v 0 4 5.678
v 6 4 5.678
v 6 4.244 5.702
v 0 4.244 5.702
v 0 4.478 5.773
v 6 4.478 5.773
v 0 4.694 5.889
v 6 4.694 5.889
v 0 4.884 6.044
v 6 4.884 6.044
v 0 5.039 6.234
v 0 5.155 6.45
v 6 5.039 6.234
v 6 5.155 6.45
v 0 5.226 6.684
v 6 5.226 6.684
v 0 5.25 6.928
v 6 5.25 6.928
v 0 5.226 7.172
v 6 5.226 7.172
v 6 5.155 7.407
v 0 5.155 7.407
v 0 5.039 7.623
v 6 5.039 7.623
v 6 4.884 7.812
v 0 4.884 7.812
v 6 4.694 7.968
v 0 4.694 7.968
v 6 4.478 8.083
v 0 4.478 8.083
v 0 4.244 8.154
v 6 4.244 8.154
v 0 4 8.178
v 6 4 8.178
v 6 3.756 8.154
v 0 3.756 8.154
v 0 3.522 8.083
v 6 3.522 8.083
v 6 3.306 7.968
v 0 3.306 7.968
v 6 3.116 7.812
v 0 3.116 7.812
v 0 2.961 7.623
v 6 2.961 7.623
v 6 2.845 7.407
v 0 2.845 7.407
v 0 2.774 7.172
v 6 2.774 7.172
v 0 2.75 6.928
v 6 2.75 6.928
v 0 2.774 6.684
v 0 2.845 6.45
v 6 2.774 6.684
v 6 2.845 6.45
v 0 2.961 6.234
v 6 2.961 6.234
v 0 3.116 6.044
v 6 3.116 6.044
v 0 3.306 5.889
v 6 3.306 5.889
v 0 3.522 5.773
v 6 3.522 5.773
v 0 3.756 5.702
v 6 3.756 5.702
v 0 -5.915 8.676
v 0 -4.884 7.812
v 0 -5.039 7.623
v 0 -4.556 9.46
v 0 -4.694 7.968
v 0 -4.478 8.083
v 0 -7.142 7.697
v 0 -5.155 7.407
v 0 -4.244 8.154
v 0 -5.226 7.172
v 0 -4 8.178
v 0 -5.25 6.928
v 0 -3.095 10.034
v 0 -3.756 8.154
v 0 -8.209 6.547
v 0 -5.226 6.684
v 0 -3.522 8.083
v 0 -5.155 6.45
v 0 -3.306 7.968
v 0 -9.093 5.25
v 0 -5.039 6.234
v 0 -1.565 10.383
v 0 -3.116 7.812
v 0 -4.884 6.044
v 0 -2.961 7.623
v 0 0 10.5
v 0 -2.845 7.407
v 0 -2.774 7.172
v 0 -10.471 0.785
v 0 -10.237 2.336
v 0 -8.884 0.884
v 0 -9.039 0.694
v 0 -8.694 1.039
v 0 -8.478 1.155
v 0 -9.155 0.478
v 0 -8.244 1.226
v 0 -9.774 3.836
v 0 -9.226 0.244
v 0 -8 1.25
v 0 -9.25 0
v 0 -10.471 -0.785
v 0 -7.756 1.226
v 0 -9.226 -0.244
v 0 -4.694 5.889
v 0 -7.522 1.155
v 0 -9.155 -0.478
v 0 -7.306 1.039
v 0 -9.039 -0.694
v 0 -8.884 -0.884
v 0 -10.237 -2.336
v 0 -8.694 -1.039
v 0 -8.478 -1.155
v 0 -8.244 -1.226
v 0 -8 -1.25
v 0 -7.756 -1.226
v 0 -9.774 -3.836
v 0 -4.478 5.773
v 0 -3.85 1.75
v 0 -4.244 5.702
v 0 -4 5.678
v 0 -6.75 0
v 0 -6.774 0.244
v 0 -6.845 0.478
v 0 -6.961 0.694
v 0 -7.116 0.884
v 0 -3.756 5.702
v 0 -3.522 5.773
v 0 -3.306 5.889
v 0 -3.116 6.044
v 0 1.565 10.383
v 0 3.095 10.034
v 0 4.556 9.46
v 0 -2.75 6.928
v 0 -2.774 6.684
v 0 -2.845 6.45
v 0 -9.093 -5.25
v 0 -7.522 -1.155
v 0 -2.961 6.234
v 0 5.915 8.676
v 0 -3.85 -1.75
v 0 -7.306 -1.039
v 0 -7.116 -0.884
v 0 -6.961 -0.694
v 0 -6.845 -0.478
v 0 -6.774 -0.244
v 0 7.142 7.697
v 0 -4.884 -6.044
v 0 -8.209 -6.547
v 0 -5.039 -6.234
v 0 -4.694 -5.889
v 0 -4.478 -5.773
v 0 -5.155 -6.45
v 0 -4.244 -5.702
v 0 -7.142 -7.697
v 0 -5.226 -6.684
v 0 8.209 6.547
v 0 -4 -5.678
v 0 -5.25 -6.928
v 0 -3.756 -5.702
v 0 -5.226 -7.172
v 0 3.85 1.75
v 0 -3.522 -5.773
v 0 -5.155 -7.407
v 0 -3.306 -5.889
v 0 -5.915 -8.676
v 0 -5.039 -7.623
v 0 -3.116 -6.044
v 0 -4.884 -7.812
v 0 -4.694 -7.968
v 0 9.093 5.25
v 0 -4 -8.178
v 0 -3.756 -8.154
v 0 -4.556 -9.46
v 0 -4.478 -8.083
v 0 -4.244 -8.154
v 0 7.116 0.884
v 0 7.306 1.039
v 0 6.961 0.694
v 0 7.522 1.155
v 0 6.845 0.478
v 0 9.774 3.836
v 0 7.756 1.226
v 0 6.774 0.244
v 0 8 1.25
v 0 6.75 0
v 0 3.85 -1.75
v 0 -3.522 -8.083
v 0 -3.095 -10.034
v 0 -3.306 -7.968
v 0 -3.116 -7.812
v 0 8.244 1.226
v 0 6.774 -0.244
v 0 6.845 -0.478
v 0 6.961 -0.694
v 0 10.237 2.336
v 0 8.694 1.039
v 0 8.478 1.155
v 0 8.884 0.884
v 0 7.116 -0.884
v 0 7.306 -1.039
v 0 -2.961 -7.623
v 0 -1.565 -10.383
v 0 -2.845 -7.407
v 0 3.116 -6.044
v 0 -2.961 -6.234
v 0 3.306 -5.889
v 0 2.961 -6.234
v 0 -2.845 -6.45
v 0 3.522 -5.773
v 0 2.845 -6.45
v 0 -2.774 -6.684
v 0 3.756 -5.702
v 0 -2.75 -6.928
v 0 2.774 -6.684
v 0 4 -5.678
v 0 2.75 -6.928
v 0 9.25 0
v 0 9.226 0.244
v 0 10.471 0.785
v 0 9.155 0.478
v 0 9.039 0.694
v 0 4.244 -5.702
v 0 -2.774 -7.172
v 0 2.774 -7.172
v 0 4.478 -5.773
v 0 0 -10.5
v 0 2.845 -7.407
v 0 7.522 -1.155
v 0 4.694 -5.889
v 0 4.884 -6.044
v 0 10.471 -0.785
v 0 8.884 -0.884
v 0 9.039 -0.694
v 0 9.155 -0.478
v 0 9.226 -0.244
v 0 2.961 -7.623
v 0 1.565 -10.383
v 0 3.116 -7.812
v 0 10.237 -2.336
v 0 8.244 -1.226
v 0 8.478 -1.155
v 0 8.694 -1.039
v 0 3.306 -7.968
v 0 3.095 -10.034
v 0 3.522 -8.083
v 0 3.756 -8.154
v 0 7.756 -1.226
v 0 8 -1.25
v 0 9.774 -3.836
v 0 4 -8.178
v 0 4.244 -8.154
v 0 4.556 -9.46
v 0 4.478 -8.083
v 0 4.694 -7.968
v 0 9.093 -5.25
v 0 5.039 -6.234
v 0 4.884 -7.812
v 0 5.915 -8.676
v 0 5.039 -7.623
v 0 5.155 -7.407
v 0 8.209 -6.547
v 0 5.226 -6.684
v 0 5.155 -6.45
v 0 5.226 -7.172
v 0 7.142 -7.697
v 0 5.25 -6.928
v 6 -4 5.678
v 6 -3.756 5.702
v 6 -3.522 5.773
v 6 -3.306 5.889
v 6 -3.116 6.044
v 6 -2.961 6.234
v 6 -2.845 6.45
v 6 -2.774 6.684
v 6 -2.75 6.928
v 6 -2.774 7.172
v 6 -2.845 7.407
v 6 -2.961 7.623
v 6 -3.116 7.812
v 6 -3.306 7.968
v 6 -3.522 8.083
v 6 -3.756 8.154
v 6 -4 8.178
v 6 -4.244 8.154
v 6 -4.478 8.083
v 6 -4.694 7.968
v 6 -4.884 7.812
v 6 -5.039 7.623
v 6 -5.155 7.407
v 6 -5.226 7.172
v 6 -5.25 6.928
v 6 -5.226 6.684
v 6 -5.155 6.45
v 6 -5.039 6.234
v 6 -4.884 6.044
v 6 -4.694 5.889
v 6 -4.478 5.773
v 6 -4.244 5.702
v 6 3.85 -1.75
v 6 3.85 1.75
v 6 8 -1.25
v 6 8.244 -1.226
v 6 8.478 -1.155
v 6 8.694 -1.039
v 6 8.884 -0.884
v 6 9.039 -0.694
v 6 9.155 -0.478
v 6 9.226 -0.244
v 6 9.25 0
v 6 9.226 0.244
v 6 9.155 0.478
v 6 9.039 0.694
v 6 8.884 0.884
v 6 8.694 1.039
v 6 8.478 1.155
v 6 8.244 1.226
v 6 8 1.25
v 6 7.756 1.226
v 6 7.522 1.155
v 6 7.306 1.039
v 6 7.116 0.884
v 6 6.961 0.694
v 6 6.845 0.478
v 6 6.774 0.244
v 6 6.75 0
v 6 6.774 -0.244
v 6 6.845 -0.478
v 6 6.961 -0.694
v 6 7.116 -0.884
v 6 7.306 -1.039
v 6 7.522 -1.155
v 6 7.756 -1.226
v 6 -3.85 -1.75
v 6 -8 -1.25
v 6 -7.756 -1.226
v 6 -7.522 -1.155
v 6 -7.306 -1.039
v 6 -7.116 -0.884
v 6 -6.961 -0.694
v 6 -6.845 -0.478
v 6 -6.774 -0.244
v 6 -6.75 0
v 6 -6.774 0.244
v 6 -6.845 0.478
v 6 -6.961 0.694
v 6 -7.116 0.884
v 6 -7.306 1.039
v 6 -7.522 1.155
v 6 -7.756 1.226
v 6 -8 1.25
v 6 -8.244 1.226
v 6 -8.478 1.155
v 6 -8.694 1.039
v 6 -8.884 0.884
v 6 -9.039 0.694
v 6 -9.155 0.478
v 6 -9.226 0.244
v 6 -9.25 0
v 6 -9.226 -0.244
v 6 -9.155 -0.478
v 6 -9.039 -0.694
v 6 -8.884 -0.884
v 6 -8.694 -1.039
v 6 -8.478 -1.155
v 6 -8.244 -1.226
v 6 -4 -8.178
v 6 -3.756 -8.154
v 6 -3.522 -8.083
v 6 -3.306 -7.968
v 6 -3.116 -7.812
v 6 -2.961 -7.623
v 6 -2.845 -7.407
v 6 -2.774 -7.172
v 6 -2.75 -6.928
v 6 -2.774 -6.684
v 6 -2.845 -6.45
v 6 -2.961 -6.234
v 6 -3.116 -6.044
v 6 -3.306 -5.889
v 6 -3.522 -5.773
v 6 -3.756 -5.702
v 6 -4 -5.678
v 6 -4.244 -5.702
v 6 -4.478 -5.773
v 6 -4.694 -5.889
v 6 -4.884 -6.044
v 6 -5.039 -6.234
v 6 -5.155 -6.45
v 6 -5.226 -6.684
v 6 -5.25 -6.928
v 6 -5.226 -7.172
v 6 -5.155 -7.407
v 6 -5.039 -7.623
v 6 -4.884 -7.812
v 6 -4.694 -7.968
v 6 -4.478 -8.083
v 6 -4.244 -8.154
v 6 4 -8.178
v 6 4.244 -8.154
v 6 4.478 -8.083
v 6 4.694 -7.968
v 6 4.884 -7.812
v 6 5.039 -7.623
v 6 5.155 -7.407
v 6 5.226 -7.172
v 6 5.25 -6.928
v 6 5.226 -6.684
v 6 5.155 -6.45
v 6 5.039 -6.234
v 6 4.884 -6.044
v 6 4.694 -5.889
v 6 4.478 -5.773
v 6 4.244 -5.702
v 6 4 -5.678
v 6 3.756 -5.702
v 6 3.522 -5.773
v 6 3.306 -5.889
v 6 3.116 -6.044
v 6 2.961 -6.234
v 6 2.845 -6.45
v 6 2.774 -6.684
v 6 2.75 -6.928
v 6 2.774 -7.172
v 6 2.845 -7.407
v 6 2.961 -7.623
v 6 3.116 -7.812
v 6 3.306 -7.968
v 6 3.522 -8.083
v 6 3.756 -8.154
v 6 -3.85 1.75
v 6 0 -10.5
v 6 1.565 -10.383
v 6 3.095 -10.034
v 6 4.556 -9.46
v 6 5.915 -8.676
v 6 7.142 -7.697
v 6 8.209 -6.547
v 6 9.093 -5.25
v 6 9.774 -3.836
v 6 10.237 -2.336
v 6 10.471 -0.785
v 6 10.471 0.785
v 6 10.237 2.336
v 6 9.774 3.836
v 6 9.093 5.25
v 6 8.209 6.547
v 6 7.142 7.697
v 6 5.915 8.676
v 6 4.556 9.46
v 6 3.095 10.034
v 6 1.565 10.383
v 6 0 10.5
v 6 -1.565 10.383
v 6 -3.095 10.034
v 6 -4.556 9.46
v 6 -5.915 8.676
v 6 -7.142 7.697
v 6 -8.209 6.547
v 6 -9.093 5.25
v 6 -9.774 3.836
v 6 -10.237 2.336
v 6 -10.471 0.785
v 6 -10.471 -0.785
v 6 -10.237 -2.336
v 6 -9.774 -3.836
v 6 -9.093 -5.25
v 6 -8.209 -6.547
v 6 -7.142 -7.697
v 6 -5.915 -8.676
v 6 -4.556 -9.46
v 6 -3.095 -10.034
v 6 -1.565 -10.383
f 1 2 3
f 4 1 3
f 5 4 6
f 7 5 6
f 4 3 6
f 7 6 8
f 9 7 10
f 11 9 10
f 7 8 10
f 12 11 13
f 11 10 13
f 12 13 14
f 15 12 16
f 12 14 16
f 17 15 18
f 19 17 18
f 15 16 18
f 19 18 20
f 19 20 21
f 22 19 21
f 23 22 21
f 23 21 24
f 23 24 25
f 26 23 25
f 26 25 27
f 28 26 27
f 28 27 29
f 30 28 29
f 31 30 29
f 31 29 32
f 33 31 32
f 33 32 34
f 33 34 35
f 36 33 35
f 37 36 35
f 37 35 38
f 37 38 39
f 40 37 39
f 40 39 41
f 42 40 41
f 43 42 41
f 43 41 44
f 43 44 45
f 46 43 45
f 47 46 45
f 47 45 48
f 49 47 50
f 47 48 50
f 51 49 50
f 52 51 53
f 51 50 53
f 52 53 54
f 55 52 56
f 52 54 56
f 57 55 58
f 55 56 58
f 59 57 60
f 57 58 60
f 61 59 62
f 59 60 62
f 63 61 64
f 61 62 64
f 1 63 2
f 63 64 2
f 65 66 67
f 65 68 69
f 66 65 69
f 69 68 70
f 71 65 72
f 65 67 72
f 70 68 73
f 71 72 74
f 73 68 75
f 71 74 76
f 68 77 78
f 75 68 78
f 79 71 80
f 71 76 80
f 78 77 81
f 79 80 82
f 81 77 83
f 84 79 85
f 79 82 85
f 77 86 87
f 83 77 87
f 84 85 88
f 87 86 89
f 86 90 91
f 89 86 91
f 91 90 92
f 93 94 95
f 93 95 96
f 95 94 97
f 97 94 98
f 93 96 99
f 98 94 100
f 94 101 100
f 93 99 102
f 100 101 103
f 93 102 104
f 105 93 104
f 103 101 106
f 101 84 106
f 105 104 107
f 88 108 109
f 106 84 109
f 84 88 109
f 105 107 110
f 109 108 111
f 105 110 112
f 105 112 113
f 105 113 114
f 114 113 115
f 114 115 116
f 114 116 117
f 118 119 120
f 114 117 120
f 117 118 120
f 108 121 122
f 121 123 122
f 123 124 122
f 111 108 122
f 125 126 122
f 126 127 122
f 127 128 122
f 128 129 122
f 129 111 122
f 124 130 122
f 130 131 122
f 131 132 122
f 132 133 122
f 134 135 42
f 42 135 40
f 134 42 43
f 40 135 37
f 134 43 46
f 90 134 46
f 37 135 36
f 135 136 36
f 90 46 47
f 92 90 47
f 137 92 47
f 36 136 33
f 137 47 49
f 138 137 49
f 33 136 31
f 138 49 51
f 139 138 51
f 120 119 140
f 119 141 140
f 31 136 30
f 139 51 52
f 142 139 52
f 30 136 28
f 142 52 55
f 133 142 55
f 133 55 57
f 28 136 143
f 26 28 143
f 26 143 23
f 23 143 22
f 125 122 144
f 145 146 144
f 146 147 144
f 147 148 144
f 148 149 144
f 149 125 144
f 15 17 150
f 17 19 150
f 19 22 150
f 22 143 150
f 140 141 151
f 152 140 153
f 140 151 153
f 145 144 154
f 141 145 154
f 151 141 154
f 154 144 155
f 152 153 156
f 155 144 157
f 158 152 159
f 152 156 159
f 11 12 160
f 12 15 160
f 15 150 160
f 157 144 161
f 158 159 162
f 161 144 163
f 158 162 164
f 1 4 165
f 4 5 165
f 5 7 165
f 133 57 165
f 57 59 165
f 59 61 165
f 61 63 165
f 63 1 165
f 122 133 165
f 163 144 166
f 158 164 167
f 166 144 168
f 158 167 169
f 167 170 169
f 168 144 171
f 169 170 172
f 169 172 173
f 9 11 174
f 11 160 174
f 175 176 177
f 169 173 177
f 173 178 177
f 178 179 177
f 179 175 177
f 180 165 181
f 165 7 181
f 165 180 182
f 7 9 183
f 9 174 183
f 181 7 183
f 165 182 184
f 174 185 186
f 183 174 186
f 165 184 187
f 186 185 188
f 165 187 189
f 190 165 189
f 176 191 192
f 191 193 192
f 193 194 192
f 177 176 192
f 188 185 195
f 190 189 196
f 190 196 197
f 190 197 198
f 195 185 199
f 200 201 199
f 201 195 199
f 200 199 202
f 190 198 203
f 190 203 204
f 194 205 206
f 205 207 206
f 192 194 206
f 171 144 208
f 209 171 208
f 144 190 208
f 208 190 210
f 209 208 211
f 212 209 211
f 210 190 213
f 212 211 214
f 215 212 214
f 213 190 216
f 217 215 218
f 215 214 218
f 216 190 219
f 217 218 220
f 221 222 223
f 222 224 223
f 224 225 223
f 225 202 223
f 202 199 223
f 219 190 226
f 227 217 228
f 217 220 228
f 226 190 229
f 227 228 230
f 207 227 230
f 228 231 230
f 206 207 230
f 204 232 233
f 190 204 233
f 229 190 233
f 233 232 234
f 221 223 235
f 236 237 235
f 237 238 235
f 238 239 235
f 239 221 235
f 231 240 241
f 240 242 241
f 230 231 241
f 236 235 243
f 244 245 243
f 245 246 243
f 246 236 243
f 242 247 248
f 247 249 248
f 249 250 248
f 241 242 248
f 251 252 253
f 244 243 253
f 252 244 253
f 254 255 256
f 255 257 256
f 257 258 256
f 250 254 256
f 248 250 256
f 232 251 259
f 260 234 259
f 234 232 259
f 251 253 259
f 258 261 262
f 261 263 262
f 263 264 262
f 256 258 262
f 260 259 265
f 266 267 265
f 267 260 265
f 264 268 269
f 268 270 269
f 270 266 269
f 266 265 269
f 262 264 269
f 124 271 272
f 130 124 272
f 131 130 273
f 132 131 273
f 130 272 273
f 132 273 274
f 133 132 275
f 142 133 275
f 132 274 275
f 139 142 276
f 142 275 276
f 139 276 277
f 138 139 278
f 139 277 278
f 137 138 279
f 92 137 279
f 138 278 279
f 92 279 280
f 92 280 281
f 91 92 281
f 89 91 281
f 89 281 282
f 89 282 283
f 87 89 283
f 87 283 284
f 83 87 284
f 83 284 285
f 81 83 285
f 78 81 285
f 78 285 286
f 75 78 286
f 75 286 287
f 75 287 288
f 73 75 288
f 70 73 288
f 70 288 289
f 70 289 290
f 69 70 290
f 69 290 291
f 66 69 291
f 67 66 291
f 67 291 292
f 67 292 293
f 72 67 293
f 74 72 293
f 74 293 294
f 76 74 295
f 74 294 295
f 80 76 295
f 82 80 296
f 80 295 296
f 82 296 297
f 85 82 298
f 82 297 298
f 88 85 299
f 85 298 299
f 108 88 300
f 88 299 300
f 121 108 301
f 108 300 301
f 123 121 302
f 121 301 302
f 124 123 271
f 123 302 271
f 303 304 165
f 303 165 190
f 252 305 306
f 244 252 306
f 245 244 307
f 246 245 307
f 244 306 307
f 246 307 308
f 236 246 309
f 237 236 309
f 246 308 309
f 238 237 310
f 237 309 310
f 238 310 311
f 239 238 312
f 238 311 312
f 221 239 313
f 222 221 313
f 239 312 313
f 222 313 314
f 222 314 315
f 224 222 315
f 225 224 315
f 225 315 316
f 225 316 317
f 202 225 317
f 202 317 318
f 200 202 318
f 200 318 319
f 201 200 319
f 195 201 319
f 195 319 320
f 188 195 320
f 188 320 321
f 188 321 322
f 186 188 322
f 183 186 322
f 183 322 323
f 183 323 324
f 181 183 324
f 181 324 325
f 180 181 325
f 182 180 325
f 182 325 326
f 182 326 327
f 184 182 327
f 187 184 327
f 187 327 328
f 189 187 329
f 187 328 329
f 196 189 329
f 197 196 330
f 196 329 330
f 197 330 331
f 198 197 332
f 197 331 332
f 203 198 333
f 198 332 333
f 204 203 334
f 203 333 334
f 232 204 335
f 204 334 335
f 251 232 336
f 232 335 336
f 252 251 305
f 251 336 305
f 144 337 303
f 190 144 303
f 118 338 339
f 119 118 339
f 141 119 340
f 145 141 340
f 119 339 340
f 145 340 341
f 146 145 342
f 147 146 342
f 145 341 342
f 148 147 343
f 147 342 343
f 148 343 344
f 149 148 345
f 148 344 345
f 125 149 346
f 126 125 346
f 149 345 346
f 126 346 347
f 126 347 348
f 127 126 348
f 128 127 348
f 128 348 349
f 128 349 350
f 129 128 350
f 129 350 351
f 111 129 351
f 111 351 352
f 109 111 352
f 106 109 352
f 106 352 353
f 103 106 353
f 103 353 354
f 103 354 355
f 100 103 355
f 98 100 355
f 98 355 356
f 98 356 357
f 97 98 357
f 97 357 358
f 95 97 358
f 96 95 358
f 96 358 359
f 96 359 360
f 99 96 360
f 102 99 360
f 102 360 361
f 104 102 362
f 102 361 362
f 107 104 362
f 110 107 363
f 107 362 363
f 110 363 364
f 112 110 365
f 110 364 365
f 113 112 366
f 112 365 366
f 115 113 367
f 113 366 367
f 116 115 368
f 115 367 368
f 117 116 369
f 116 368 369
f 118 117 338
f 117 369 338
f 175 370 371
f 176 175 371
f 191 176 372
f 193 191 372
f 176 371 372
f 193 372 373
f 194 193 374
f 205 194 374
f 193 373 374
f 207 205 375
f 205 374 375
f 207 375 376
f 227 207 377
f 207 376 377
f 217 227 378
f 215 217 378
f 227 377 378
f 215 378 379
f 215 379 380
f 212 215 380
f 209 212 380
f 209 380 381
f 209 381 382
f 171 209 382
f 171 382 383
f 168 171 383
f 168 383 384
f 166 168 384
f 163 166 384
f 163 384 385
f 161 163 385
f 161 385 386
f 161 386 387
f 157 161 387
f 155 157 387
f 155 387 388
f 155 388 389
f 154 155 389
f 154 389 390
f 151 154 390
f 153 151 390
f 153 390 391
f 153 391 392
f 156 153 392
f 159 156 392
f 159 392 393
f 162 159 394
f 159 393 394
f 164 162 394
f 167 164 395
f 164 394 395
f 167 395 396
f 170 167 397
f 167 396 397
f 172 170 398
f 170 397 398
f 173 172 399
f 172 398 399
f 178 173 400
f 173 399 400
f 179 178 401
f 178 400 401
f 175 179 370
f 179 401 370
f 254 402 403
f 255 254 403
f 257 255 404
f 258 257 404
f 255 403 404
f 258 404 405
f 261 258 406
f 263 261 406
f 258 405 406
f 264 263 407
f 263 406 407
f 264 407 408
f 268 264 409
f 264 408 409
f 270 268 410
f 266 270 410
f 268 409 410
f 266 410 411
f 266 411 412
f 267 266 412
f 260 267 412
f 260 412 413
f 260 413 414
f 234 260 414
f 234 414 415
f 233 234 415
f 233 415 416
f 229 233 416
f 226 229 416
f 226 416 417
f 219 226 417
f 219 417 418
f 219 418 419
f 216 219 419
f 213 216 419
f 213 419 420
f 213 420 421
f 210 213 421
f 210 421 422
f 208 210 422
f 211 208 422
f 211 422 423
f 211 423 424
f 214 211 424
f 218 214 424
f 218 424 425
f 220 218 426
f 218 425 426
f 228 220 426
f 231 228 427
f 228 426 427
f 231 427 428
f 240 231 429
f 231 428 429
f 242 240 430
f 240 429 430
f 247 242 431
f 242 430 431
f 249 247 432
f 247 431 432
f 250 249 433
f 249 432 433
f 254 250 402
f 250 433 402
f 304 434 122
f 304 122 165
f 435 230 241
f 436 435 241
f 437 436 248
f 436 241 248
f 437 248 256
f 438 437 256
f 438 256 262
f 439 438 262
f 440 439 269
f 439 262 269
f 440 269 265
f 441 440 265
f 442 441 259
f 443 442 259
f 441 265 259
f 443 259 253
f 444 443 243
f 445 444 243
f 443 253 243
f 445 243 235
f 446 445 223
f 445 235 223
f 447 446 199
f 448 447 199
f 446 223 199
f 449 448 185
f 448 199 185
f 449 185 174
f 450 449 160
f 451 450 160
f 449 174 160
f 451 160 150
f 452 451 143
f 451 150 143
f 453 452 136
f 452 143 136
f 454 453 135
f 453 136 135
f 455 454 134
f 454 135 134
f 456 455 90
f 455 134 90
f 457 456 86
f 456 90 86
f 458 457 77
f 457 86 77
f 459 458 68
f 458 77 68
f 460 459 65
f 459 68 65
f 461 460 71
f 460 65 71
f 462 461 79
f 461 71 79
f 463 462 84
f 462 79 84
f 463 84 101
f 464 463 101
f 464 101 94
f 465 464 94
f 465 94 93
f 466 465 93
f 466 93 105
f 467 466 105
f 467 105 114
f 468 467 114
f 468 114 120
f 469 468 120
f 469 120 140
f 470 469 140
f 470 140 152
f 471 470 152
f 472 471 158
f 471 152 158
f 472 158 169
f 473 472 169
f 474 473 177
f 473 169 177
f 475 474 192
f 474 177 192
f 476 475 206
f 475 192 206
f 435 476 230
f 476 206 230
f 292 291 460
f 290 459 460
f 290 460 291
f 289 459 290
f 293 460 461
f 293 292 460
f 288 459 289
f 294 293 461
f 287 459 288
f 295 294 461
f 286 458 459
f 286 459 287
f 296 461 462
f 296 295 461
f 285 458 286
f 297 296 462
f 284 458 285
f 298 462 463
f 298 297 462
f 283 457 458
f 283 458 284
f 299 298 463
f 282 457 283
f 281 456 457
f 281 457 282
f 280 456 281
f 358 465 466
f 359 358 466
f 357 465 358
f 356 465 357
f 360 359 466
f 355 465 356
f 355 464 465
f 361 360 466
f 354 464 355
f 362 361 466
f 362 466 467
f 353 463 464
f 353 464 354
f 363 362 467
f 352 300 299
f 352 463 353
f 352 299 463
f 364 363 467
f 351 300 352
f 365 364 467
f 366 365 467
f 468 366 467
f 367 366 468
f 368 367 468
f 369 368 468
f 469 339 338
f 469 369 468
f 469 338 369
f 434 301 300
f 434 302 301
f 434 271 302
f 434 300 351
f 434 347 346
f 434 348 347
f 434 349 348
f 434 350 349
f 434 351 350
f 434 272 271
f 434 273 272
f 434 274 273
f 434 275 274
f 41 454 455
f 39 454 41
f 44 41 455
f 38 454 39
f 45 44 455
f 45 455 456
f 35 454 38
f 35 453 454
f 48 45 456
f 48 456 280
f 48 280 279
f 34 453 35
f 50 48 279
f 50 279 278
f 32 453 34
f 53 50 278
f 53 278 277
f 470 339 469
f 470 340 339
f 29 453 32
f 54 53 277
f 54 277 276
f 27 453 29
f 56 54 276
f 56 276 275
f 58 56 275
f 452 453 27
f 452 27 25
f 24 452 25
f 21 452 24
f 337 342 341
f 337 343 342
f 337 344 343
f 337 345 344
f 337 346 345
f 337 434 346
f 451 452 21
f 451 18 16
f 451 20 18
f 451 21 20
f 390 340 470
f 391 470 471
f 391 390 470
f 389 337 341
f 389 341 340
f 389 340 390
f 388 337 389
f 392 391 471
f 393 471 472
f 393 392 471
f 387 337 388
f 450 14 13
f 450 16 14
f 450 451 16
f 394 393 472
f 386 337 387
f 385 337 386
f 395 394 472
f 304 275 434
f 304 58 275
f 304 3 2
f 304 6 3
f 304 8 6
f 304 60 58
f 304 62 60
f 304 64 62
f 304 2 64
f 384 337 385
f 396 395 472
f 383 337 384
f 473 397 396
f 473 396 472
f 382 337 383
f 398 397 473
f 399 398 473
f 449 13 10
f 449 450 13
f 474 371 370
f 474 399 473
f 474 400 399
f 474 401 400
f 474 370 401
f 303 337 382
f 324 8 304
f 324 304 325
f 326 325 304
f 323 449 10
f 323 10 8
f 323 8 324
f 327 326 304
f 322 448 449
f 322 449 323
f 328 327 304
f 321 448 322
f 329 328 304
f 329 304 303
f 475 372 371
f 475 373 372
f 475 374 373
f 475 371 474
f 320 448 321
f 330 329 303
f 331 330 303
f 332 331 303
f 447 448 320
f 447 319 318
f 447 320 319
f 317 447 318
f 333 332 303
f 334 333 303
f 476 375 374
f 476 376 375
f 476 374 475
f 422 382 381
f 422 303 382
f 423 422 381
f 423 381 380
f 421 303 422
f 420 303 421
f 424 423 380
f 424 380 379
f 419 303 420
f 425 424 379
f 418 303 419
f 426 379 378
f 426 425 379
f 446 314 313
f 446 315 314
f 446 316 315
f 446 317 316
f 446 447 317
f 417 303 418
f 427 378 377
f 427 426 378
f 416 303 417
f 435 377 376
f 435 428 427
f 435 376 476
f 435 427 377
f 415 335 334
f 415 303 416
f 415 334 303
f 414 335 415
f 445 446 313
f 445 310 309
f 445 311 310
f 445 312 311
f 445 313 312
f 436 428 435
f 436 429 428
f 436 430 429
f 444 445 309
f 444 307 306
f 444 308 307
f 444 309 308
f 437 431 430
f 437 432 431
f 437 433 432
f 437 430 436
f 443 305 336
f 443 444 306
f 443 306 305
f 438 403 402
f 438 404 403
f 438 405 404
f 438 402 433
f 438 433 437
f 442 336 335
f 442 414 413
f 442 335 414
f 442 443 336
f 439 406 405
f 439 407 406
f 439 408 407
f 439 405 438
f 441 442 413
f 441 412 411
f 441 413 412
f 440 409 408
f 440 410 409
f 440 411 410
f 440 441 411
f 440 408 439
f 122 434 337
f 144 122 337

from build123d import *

# Parameters (mm, degrees)
SKETCH1_R           = 10.5
BOSS_EXTRUDE1_DEPTH = 6
SKETCH2_R           = 1.25
CUT_EXTRUDE1_DEPTH  = 17.015617378
SKETCH3_W           = 3.5
SKETCH3_H           = 7.7
CUT_EXTRUDE2_DEPTH  = 6


with BuildPart() as part:
    # Sketch1 → Boss-Extrude1 (new body)
    with BuildSketch(Plane(origin=(0, 0, 0), x_dir=(0, 0, -1), z_dir=(1, 0, 0))):
        Circle(SKETCH1_R)
    extrude(amount=BOSS_EXTRUDE1_DEPTH)

    # Sketch2 → Cut-Extrude1 (cut, through all)
    with BuildSketch(Plane(origin=(6, 0, 0), x_dir=(0, 0, -1), z_dir=(1, 0, 0))):
        with Locations((0, 8)):
            Circle(SKETCH2_R)
        with Locations((6.92820323, 4)):
            Circle(SKETCH2_R)
        with Locations((6.92820323, -4)):
            Circle(SKETCH2_R)
        with Locations((0, -8)):
            Circle(SKETCH2_R)
        with Locations((-6.92820323, -4)):
            Circle(SKETCH2_R)
        with Locations((-6.92820323, 4)):
            Circle(SKETCH2_R)
    extrude(amount=-CUT_EXTRUDE1_DEPTH, mode=Mode.SUBTRACT)

    # Sketch3 → Cut-Extrude2 (cut)
    with BuildSketch(Plane(origin=(6, 0, 0), x_dir=(0, 0, -1), z_dir=(1, 0, 0))):
        Rectangle(SKETCH3_W, SKETCH3_H)
    extrude(amount=-CUT_EXTRUDE2_DEPTH, mode=Mode.SUBTRACT)


solid = part.part
